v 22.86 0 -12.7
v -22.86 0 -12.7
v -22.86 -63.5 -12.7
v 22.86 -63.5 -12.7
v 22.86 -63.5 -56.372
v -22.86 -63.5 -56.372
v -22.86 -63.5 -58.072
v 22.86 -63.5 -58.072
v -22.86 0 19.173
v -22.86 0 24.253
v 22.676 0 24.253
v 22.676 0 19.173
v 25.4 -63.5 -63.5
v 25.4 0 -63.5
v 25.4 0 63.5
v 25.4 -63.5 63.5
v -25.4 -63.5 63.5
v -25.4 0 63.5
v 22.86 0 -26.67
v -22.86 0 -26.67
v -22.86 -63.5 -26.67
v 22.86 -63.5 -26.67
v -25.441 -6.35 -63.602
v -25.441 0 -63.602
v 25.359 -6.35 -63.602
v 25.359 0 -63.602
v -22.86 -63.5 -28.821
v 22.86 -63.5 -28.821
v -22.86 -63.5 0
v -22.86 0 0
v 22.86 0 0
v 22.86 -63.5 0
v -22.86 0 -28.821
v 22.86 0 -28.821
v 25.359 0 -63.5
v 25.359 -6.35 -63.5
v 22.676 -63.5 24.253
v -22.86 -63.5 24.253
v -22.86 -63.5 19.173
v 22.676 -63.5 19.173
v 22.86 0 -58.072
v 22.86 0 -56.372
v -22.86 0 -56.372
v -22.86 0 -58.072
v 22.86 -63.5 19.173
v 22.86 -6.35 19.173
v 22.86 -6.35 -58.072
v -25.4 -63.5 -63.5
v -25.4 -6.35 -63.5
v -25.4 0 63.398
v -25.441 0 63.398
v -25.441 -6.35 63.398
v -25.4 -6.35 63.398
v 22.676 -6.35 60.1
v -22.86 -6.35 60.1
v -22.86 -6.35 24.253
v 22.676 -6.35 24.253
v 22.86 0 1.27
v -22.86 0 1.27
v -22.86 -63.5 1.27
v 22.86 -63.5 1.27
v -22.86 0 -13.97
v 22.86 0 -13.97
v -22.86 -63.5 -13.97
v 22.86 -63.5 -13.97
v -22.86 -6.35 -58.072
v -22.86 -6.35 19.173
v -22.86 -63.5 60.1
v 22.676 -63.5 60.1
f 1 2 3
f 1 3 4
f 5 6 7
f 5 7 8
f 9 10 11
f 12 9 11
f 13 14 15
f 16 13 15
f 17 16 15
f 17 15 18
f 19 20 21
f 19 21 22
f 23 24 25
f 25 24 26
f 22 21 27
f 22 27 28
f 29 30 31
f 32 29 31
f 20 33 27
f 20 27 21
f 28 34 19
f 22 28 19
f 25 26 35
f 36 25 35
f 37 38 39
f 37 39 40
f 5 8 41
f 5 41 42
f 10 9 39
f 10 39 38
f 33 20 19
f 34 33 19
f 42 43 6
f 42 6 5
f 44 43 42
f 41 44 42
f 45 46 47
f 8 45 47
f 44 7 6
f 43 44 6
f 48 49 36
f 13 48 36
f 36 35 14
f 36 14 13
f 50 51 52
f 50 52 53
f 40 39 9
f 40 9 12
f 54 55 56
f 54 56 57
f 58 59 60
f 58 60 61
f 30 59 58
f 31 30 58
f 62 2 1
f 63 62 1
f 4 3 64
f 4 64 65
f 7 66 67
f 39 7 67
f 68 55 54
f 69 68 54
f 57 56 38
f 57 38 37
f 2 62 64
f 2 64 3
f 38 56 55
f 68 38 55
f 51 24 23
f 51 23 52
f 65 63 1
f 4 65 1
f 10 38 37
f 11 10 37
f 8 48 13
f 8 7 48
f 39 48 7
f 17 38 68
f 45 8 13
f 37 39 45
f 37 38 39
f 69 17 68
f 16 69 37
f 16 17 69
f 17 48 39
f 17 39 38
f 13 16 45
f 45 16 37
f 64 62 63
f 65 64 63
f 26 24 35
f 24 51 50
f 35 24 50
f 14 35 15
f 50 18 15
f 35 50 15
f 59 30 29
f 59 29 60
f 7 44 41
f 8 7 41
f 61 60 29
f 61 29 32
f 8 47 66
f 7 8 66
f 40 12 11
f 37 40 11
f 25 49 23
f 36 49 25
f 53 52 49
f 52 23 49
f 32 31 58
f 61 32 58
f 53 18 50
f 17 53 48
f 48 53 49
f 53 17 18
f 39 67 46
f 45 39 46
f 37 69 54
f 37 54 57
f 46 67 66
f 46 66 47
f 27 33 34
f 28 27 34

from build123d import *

# Parameters (mm, degrees)
F0_W     = 45.535646
F0_H     = 5.08
F1_DEPTH = 63.5
F2_W     = 50.8
F2_H     = 127
F3_DEPTH = 6.35
F0_W_2   = 45.72
F0_H_2   = 1.27
F0_H_3   = 2.150806
F0_H_4   = 1.700164
F4_DEPTH = 63.5


with BuildPart() as f1:
    # F0 (on Front) → F1 (new body)
    with BuildSketch(Plane.XZ):
        Polygon((25.4, 51.066291), (25.4, 63.5), (22.86, 63.5), (-22.86, 63.5), (-22.86, 60.09968), (22.675646, 60.09968), (22.675646, 24.252903), (22.675646, 19.172903), (22.86, 19.172903), (22.86, 2.765323), (22.86, 1.27), (22.86, 0), (22.86, -12.7), (22.86, -13.97), (22.86, -26.67), (22.86, -28.820806), (22.86, -30.971613), (22.86, -56.371613), (22.86, -58.071777), (-22.86, -58.071777), (-22.86, -56.371613), (-22.86, -30.971613), (-22.86, -28.820806), (-22.86, -26.67), (-22.86, -13.97), (-22.86, -12.7), (-22.86, 0), (-22.86, 1.27), (-22.86, 2.765323), (-22.86, 19.172903), (-22.86, 24.252903), (-22.86, 51.066291), (-25.4, 51.066291), (-25.4, -63.5), (0, -63.5), (25.4, -63.5), align=None)
        with Locations((-0.092177, 21.712903)):
            Rectangle(F0_W, F0_H)
        Polygon((-22.86, 60.09968), (-22.86, 63.5), (-25.4, 63.5), (-25.4, 51.066291), (-22.86, 51.066291), align=None)
    extrude(amount=F1_DEPTH)

    # F2 (on Front) → F3 (join)
    with BuildSketch(Plane.XZ):
        with Locations((-0.040969, -0.102418)):
            Rectangle(F2_W, F2_H)
    extrude(amount=F3_DEPTH)


with BuildPart() as f4:
    # F0 (on Front) → F4 (new body)
    with BuildSketch(Plane.XZ):
        with Locations((0, 0.635)):
            Rectangle(F0_W_2, F0_H_2)
        with Locations((0, -13.335)):
            Rectangle(F0_W_2, F0_H_2)
        with Locations((0, -27.745403)):
            Rectangle(F0_W_2, F0_H_3)
        with Locations((-0.092177, 21.712903)):
            Rectangle(F0_W, F0_H)
        with Locations((0, -57.221695)):
            Rectangle(F0_W_2, F0_H_4)
    extrude(amount=F4_DEPTH)


solid = Compound([f1.part, f4.part])
